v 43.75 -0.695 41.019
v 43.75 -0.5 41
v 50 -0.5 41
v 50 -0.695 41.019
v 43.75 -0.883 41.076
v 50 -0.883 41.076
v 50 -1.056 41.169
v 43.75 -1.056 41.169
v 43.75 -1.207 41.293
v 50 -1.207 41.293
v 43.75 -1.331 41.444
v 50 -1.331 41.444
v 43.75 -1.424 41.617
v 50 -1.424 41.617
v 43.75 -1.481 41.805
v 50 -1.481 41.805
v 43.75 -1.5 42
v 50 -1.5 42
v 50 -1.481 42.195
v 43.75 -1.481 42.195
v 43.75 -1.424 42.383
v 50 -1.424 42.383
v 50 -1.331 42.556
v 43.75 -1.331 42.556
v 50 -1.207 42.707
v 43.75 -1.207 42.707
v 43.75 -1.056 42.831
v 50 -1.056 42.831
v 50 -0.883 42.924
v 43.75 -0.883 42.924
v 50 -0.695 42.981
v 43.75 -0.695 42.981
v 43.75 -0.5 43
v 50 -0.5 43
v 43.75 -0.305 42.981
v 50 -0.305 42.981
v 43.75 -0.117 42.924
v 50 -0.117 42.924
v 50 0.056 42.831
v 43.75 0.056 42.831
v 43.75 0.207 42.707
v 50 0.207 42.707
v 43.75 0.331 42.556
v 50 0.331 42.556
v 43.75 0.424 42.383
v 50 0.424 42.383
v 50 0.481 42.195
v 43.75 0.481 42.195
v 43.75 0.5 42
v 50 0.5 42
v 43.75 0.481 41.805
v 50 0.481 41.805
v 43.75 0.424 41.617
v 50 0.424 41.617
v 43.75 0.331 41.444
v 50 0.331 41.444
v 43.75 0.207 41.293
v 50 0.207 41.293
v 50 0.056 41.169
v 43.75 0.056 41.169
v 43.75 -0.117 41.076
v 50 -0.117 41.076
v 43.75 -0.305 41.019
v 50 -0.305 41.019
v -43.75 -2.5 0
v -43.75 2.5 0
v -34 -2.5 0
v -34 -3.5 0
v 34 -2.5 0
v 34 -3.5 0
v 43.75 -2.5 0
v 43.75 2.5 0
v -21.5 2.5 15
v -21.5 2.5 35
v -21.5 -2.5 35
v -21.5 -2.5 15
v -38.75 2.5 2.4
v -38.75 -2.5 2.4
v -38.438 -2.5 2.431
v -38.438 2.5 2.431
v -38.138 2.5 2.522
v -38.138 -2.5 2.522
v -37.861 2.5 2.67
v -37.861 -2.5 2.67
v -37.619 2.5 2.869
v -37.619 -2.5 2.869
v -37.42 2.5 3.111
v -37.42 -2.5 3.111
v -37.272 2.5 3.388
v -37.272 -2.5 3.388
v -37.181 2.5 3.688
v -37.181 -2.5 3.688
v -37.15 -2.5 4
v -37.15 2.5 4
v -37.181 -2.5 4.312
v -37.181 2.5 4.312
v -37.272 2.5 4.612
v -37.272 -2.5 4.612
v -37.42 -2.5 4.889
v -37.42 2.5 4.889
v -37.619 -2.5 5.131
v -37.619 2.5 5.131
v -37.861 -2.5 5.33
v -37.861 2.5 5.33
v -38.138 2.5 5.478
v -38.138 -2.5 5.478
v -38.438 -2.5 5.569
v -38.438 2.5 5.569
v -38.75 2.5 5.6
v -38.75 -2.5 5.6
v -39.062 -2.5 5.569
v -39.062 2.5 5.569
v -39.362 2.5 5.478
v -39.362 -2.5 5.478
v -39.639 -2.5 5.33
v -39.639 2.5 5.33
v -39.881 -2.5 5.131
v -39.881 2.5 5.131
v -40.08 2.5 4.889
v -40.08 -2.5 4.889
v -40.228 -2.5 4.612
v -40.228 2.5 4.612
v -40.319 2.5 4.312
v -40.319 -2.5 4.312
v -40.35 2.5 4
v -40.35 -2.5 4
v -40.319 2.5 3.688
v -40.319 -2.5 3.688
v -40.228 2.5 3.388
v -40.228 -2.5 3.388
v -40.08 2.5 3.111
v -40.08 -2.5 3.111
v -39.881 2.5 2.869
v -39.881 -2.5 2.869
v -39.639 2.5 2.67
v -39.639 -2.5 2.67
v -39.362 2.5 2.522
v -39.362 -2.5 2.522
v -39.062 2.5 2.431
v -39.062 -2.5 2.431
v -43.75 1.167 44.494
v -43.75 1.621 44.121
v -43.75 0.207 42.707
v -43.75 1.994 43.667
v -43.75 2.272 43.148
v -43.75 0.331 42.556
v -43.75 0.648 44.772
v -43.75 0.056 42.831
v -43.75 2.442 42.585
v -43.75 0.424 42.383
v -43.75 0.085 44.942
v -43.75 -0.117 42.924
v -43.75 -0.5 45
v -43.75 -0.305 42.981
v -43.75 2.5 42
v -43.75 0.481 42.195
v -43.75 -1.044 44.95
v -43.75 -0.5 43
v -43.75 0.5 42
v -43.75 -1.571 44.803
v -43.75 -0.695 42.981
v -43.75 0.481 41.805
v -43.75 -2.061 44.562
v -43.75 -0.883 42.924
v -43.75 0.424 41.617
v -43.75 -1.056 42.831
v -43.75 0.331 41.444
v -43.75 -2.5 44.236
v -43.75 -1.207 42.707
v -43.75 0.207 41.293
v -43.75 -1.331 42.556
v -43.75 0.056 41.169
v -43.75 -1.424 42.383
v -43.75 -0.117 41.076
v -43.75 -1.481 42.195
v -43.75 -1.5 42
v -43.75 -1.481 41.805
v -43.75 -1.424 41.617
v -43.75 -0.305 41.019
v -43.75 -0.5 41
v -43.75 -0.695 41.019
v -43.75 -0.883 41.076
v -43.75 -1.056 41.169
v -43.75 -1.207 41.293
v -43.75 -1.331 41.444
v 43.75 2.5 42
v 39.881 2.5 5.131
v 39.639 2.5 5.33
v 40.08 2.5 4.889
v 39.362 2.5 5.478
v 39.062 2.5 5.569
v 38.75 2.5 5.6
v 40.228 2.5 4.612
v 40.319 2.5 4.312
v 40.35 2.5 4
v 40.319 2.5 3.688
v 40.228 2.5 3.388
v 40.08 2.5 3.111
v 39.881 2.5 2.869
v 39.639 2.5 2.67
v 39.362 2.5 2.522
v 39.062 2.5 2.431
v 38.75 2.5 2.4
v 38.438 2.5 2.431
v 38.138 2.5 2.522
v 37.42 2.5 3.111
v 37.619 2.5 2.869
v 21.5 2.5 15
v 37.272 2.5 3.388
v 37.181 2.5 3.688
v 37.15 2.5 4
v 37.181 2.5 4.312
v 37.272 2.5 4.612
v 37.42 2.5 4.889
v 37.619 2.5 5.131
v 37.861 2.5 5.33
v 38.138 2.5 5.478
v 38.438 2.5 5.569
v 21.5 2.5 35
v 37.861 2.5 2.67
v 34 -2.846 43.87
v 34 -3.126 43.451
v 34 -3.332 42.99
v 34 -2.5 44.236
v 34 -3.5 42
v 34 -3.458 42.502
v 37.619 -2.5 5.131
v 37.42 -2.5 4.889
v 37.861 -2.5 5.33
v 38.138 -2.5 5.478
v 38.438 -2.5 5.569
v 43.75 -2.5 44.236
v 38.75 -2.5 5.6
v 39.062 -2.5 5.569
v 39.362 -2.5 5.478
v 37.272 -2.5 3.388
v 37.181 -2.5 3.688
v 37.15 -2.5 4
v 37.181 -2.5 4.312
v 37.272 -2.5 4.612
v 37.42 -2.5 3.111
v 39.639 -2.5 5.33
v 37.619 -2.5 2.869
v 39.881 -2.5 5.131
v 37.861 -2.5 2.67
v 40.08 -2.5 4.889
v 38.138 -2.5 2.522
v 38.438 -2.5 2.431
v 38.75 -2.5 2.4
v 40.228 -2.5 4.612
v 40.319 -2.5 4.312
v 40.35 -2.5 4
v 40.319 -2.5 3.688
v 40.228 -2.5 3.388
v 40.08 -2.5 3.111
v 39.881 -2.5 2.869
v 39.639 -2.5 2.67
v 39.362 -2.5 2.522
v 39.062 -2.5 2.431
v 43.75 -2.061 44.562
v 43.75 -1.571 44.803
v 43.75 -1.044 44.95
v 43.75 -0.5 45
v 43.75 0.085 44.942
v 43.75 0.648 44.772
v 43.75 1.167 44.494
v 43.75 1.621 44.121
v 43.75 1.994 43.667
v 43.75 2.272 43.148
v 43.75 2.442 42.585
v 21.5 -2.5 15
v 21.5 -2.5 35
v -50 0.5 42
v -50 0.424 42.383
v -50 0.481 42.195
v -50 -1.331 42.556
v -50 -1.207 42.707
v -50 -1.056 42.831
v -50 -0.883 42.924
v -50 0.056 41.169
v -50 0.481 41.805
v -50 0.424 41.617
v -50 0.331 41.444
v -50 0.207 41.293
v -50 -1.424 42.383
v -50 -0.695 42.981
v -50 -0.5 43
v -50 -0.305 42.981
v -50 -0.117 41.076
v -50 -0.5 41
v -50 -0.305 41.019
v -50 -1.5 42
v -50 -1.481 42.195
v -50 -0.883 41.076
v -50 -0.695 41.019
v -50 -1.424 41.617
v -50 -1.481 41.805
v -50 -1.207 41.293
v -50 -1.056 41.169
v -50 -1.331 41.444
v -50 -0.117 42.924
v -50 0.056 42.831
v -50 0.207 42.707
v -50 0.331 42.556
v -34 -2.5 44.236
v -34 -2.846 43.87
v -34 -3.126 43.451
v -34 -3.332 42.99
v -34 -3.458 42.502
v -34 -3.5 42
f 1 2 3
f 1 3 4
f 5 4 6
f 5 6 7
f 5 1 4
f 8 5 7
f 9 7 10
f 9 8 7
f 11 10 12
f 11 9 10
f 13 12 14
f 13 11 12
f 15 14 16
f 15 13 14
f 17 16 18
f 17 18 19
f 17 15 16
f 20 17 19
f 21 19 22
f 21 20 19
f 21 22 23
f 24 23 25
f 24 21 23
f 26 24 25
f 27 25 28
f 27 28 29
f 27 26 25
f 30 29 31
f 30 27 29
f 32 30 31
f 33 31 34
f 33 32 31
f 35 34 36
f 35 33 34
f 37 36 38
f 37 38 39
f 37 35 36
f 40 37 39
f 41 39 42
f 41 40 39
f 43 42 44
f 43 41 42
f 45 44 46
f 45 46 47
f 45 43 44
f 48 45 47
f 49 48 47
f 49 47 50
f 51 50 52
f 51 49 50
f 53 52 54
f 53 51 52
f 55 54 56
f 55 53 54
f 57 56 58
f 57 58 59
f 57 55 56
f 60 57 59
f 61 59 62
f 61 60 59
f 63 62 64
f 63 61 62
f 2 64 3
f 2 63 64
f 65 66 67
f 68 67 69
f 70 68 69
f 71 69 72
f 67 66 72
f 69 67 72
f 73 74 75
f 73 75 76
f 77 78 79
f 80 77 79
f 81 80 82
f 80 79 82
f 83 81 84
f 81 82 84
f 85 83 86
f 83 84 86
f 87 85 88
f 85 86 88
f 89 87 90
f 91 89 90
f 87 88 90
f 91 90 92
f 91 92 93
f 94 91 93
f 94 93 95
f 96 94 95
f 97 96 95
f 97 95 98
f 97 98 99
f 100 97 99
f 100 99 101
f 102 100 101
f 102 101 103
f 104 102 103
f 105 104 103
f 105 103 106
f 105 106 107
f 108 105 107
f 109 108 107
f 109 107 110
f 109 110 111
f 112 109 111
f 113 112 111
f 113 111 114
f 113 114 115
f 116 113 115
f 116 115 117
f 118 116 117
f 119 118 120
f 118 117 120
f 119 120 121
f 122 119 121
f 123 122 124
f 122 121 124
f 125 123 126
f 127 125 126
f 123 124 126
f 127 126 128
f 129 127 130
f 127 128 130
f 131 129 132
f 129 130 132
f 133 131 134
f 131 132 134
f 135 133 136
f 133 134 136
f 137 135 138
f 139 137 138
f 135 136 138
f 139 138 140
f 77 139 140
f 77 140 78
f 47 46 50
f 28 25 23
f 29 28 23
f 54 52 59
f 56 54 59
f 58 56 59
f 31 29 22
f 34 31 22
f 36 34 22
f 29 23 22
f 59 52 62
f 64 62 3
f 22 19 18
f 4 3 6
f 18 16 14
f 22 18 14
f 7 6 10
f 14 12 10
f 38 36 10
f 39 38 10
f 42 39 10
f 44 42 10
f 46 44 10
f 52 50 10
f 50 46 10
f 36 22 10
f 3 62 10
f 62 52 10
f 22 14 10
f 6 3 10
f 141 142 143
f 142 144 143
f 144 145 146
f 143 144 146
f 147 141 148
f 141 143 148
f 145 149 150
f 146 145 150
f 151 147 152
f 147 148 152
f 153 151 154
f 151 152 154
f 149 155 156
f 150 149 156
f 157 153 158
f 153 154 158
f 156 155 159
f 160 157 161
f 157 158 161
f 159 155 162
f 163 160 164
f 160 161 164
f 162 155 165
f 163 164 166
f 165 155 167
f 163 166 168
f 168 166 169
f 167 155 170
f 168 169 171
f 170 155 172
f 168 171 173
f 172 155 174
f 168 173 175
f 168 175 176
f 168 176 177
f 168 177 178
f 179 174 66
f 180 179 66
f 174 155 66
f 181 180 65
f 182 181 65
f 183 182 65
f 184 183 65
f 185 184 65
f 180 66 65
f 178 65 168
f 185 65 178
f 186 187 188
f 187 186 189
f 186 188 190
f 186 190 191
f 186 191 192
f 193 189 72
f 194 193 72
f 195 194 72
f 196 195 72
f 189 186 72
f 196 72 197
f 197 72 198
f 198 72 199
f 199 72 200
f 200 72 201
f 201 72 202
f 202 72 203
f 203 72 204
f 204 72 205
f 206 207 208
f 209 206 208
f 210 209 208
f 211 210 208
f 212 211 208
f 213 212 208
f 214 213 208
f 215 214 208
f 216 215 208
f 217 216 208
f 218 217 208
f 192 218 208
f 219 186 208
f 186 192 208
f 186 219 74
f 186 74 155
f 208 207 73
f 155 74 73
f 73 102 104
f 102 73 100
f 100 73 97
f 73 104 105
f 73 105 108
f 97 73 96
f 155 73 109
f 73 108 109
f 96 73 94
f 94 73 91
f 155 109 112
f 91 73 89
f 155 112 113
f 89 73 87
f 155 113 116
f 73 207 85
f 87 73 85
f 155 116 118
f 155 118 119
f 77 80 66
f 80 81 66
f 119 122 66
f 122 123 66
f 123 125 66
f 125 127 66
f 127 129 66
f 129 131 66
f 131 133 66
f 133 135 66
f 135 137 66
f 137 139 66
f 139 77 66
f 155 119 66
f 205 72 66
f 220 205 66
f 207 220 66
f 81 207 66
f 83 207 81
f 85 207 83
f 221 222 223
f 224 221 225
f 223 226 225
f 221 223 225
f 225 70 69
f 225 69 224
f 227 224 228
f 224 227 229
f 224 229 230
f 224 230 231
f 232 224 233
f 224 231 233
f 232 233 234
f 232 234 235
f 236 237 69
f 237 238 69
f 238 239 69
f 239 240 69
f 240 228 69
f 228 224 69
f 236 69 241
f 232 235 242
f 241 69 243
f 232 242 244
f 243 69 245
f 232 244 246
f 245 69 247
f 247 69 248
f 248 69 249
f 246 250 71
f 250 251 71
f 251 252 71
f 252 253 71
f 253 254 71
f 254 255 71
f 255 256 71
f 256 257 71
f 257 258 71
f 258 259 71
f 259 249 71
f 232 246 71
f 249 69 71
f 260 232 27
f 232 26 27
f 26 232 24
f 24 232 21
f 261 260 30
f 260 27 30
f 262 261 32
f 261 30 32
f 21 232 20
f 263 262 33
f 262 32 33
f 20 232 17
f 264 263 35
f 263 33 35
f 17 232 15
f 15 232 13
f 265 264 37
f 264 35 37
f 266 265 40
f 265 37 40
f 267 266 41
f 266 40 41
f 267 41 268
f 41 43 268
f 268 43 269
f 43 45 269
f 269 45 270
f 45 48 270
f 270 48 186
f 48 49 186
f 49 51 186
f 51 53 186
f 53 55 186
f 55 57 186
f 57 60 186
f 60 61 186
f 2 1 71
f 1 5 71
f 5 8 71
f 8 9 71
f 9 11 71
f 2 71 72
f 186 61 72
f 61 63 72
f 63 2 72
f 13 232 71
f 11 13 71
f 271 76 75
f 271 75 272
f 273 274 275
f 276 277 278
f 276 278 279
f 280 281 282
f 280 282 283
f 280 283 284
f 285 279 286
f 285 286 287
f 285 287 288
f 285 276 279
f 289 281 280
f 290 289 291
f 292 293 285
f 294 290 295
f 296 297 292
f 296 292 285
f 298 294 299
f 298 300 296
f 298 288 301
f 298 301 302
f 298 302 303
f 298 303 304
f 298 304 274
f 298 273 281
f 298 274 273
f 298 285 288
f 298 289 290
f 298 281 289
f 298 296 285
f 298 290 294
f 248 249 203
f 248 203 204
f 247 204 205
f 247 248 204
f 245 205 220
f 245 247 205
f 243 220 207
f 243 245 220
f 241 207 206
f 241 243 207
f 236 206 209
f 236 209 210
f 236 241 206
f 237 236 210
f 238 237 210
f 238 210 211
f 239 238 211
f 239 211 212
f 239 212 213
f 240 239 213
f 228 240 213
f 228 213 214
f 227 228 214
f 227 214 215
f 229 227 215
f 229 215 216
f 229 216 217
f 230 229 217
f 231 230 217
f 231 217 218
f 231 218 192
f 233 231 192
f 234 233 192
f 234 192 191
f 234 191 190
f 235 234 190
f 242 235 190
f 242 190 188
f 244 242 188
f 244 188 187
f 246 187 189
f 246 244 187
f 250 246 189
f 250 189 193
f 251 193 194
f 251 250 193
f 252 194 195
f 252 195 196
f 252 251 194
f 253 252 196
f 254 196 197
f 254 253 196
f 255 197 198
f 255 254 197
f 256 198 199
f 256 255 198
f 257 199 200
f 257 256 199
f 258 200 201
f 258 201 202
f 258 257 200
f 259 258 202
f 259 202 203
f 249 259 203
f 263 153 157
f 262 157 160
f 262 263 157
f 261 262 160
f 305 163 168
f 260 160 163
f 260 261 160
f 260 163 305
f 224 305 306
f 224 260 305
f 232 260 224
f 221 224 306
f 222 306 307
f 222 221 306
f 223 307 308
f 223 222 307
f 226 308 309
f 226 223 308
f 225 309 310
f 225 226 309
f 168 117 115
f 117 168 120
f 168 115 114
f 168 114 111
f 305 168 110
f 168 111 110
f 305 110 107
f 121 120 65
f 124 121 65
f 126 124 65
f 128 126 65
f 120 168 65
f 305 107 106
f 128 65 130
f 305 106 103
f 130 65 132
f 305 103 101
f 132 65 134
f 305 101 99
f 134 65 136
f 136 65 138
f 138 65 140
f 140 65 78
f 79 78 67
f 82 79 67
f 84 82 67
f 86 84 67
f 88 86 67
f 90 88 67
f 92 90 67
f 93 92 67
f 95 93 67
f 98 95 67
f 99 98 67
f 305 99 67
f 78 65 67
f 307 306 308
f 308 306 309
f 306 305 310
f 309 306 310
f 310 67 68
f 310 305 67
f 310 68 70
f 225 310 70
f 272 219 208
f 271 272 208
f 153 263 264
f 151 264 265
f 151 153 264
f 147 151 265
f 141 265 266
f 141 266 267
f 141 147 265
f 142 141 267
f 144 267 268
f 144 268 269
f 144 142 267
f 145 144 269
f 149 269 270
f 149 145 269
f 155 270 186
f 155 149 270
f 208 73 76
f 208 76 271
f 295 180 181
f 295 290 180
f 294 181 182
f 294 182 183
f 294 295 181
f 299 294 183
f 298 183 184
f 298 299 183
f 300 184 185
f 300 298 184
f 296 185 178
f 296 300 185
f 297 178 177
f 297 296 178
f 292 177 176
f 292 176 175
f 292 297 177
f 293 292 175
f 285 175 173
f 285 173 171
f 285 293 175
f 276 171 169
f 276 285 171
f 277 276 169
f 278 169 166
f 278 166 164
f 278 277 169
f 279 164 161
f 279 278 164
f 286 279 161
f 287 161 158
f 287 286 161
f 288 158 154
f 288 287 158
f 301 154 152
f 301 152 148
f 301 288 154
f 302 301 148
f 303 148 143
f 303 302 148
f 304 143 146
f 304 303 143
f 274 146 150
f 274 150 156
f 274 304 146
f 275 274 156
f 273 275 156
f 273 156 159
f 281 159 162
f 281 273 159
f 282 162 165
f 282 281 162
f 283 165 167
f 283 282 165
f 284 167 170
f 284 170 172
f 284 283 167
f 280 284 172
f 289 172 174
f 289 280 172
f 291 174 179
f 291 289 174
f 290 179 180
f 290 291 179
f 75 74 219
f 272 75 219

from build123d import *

# Parameters (mm, degrees)
EXTRUDE_1_DEPTH     = 45
SKETCH_2_W          = 43
SKETCH_2_H          = 20
CUT_EXTRUDE_2_DEPTH = 5
FILLET_2_R          = 3
EXTRUDE_START       = -43.75
SKETCH_4_R          = 1
EXTRUDE_2_DEPTH     = 50
CUT_EXTRUDE_3_REACH = 69.454
SKETCH_5_R          = 1.6


with BuildPart() as part:
    # 草图1 → 凸台-拉伸1 (new body)
    with BuildSketch(Plane.XY):
        Polygon((34, -2.5), (43.75, -2.5), (43.75, 2.5), (-43.75, 2.5), (-43.75, -2.5), (-34, -2.5), (-34, -3.5), (34, -3.5), align=None)
    extrude(amount=EXTRUDE_1_DEPTH)

    # 草图2 → 切除-拉伸2 (cut)
    with BuildSketch(Plane(origin=(0, 2.5, 0), x_dir=(1, 0, 0), z_dir=(0, 1, 0))):
        with Locations((0, -25)):
            Rectangle(SKETCH_2_W, SKETCH_2_H)
    extrude(amount=-CUT_EXTRUDE_2_DEPTH, mode=Mode.SUBTRACT)

    # 圆角2
    fillet_2_edges = [part.edges().sort_by_distance(p)[0] for p in [
        (0, -3.5, 45),
        (0, 2.5, 45),
    ]]
    fillet(fillet_2_edges, radius=FILLET_2_R - 0.0001)  # a hair under: the kernel refuses the full size

    # 草图4 → 凸台-拉伸2 (add, symmetric)
    with BuildSketch(Plane.ZY.offset(43.75).offset(EXTRUDE_START)):
        with Locations(Location((42, -0.5, 0), (0, 0, 180))):
            Circle(SKETCH_4_R)
    extrude(amount=EXTRUDE_2_DEPTH, both=True)

    # 草图5 → 切除-拉伸3 (cut, up to next)
    with BuildSketch(Plane.XZ.offset(2.5), mode=Mode.PRIVATE) as cut_extrude_3_sk1:
        with Locations(Location((-38.75, 4, 0), (0, 0, 270))):
            Circle(SKETCH_5_R)
    cut_extrude_3_tool1 = extrude(cut_extrude_3_sk1.sketch, amount=-CUT_EXTRUDE_3_REACH, mode=Mode.PRIVATE) & part.part
    cut_extrude_3 = cut_extrude_3_tool1.solids().sort_by_distance((-38.75, -2.5, 4))[0]
    add(cut_extrude_3, mode=Mode.SUBTRACT)

    # 镜向1: 切除-拉伸3 across plane
    add(cut_extrude_3.mirror(Plane(origin=(0, 0, 0), x_dir=(0, 0, 1), z_dir=(1, 0, 0))), mode=Mode.SUBTRACT)


solid = part.part
